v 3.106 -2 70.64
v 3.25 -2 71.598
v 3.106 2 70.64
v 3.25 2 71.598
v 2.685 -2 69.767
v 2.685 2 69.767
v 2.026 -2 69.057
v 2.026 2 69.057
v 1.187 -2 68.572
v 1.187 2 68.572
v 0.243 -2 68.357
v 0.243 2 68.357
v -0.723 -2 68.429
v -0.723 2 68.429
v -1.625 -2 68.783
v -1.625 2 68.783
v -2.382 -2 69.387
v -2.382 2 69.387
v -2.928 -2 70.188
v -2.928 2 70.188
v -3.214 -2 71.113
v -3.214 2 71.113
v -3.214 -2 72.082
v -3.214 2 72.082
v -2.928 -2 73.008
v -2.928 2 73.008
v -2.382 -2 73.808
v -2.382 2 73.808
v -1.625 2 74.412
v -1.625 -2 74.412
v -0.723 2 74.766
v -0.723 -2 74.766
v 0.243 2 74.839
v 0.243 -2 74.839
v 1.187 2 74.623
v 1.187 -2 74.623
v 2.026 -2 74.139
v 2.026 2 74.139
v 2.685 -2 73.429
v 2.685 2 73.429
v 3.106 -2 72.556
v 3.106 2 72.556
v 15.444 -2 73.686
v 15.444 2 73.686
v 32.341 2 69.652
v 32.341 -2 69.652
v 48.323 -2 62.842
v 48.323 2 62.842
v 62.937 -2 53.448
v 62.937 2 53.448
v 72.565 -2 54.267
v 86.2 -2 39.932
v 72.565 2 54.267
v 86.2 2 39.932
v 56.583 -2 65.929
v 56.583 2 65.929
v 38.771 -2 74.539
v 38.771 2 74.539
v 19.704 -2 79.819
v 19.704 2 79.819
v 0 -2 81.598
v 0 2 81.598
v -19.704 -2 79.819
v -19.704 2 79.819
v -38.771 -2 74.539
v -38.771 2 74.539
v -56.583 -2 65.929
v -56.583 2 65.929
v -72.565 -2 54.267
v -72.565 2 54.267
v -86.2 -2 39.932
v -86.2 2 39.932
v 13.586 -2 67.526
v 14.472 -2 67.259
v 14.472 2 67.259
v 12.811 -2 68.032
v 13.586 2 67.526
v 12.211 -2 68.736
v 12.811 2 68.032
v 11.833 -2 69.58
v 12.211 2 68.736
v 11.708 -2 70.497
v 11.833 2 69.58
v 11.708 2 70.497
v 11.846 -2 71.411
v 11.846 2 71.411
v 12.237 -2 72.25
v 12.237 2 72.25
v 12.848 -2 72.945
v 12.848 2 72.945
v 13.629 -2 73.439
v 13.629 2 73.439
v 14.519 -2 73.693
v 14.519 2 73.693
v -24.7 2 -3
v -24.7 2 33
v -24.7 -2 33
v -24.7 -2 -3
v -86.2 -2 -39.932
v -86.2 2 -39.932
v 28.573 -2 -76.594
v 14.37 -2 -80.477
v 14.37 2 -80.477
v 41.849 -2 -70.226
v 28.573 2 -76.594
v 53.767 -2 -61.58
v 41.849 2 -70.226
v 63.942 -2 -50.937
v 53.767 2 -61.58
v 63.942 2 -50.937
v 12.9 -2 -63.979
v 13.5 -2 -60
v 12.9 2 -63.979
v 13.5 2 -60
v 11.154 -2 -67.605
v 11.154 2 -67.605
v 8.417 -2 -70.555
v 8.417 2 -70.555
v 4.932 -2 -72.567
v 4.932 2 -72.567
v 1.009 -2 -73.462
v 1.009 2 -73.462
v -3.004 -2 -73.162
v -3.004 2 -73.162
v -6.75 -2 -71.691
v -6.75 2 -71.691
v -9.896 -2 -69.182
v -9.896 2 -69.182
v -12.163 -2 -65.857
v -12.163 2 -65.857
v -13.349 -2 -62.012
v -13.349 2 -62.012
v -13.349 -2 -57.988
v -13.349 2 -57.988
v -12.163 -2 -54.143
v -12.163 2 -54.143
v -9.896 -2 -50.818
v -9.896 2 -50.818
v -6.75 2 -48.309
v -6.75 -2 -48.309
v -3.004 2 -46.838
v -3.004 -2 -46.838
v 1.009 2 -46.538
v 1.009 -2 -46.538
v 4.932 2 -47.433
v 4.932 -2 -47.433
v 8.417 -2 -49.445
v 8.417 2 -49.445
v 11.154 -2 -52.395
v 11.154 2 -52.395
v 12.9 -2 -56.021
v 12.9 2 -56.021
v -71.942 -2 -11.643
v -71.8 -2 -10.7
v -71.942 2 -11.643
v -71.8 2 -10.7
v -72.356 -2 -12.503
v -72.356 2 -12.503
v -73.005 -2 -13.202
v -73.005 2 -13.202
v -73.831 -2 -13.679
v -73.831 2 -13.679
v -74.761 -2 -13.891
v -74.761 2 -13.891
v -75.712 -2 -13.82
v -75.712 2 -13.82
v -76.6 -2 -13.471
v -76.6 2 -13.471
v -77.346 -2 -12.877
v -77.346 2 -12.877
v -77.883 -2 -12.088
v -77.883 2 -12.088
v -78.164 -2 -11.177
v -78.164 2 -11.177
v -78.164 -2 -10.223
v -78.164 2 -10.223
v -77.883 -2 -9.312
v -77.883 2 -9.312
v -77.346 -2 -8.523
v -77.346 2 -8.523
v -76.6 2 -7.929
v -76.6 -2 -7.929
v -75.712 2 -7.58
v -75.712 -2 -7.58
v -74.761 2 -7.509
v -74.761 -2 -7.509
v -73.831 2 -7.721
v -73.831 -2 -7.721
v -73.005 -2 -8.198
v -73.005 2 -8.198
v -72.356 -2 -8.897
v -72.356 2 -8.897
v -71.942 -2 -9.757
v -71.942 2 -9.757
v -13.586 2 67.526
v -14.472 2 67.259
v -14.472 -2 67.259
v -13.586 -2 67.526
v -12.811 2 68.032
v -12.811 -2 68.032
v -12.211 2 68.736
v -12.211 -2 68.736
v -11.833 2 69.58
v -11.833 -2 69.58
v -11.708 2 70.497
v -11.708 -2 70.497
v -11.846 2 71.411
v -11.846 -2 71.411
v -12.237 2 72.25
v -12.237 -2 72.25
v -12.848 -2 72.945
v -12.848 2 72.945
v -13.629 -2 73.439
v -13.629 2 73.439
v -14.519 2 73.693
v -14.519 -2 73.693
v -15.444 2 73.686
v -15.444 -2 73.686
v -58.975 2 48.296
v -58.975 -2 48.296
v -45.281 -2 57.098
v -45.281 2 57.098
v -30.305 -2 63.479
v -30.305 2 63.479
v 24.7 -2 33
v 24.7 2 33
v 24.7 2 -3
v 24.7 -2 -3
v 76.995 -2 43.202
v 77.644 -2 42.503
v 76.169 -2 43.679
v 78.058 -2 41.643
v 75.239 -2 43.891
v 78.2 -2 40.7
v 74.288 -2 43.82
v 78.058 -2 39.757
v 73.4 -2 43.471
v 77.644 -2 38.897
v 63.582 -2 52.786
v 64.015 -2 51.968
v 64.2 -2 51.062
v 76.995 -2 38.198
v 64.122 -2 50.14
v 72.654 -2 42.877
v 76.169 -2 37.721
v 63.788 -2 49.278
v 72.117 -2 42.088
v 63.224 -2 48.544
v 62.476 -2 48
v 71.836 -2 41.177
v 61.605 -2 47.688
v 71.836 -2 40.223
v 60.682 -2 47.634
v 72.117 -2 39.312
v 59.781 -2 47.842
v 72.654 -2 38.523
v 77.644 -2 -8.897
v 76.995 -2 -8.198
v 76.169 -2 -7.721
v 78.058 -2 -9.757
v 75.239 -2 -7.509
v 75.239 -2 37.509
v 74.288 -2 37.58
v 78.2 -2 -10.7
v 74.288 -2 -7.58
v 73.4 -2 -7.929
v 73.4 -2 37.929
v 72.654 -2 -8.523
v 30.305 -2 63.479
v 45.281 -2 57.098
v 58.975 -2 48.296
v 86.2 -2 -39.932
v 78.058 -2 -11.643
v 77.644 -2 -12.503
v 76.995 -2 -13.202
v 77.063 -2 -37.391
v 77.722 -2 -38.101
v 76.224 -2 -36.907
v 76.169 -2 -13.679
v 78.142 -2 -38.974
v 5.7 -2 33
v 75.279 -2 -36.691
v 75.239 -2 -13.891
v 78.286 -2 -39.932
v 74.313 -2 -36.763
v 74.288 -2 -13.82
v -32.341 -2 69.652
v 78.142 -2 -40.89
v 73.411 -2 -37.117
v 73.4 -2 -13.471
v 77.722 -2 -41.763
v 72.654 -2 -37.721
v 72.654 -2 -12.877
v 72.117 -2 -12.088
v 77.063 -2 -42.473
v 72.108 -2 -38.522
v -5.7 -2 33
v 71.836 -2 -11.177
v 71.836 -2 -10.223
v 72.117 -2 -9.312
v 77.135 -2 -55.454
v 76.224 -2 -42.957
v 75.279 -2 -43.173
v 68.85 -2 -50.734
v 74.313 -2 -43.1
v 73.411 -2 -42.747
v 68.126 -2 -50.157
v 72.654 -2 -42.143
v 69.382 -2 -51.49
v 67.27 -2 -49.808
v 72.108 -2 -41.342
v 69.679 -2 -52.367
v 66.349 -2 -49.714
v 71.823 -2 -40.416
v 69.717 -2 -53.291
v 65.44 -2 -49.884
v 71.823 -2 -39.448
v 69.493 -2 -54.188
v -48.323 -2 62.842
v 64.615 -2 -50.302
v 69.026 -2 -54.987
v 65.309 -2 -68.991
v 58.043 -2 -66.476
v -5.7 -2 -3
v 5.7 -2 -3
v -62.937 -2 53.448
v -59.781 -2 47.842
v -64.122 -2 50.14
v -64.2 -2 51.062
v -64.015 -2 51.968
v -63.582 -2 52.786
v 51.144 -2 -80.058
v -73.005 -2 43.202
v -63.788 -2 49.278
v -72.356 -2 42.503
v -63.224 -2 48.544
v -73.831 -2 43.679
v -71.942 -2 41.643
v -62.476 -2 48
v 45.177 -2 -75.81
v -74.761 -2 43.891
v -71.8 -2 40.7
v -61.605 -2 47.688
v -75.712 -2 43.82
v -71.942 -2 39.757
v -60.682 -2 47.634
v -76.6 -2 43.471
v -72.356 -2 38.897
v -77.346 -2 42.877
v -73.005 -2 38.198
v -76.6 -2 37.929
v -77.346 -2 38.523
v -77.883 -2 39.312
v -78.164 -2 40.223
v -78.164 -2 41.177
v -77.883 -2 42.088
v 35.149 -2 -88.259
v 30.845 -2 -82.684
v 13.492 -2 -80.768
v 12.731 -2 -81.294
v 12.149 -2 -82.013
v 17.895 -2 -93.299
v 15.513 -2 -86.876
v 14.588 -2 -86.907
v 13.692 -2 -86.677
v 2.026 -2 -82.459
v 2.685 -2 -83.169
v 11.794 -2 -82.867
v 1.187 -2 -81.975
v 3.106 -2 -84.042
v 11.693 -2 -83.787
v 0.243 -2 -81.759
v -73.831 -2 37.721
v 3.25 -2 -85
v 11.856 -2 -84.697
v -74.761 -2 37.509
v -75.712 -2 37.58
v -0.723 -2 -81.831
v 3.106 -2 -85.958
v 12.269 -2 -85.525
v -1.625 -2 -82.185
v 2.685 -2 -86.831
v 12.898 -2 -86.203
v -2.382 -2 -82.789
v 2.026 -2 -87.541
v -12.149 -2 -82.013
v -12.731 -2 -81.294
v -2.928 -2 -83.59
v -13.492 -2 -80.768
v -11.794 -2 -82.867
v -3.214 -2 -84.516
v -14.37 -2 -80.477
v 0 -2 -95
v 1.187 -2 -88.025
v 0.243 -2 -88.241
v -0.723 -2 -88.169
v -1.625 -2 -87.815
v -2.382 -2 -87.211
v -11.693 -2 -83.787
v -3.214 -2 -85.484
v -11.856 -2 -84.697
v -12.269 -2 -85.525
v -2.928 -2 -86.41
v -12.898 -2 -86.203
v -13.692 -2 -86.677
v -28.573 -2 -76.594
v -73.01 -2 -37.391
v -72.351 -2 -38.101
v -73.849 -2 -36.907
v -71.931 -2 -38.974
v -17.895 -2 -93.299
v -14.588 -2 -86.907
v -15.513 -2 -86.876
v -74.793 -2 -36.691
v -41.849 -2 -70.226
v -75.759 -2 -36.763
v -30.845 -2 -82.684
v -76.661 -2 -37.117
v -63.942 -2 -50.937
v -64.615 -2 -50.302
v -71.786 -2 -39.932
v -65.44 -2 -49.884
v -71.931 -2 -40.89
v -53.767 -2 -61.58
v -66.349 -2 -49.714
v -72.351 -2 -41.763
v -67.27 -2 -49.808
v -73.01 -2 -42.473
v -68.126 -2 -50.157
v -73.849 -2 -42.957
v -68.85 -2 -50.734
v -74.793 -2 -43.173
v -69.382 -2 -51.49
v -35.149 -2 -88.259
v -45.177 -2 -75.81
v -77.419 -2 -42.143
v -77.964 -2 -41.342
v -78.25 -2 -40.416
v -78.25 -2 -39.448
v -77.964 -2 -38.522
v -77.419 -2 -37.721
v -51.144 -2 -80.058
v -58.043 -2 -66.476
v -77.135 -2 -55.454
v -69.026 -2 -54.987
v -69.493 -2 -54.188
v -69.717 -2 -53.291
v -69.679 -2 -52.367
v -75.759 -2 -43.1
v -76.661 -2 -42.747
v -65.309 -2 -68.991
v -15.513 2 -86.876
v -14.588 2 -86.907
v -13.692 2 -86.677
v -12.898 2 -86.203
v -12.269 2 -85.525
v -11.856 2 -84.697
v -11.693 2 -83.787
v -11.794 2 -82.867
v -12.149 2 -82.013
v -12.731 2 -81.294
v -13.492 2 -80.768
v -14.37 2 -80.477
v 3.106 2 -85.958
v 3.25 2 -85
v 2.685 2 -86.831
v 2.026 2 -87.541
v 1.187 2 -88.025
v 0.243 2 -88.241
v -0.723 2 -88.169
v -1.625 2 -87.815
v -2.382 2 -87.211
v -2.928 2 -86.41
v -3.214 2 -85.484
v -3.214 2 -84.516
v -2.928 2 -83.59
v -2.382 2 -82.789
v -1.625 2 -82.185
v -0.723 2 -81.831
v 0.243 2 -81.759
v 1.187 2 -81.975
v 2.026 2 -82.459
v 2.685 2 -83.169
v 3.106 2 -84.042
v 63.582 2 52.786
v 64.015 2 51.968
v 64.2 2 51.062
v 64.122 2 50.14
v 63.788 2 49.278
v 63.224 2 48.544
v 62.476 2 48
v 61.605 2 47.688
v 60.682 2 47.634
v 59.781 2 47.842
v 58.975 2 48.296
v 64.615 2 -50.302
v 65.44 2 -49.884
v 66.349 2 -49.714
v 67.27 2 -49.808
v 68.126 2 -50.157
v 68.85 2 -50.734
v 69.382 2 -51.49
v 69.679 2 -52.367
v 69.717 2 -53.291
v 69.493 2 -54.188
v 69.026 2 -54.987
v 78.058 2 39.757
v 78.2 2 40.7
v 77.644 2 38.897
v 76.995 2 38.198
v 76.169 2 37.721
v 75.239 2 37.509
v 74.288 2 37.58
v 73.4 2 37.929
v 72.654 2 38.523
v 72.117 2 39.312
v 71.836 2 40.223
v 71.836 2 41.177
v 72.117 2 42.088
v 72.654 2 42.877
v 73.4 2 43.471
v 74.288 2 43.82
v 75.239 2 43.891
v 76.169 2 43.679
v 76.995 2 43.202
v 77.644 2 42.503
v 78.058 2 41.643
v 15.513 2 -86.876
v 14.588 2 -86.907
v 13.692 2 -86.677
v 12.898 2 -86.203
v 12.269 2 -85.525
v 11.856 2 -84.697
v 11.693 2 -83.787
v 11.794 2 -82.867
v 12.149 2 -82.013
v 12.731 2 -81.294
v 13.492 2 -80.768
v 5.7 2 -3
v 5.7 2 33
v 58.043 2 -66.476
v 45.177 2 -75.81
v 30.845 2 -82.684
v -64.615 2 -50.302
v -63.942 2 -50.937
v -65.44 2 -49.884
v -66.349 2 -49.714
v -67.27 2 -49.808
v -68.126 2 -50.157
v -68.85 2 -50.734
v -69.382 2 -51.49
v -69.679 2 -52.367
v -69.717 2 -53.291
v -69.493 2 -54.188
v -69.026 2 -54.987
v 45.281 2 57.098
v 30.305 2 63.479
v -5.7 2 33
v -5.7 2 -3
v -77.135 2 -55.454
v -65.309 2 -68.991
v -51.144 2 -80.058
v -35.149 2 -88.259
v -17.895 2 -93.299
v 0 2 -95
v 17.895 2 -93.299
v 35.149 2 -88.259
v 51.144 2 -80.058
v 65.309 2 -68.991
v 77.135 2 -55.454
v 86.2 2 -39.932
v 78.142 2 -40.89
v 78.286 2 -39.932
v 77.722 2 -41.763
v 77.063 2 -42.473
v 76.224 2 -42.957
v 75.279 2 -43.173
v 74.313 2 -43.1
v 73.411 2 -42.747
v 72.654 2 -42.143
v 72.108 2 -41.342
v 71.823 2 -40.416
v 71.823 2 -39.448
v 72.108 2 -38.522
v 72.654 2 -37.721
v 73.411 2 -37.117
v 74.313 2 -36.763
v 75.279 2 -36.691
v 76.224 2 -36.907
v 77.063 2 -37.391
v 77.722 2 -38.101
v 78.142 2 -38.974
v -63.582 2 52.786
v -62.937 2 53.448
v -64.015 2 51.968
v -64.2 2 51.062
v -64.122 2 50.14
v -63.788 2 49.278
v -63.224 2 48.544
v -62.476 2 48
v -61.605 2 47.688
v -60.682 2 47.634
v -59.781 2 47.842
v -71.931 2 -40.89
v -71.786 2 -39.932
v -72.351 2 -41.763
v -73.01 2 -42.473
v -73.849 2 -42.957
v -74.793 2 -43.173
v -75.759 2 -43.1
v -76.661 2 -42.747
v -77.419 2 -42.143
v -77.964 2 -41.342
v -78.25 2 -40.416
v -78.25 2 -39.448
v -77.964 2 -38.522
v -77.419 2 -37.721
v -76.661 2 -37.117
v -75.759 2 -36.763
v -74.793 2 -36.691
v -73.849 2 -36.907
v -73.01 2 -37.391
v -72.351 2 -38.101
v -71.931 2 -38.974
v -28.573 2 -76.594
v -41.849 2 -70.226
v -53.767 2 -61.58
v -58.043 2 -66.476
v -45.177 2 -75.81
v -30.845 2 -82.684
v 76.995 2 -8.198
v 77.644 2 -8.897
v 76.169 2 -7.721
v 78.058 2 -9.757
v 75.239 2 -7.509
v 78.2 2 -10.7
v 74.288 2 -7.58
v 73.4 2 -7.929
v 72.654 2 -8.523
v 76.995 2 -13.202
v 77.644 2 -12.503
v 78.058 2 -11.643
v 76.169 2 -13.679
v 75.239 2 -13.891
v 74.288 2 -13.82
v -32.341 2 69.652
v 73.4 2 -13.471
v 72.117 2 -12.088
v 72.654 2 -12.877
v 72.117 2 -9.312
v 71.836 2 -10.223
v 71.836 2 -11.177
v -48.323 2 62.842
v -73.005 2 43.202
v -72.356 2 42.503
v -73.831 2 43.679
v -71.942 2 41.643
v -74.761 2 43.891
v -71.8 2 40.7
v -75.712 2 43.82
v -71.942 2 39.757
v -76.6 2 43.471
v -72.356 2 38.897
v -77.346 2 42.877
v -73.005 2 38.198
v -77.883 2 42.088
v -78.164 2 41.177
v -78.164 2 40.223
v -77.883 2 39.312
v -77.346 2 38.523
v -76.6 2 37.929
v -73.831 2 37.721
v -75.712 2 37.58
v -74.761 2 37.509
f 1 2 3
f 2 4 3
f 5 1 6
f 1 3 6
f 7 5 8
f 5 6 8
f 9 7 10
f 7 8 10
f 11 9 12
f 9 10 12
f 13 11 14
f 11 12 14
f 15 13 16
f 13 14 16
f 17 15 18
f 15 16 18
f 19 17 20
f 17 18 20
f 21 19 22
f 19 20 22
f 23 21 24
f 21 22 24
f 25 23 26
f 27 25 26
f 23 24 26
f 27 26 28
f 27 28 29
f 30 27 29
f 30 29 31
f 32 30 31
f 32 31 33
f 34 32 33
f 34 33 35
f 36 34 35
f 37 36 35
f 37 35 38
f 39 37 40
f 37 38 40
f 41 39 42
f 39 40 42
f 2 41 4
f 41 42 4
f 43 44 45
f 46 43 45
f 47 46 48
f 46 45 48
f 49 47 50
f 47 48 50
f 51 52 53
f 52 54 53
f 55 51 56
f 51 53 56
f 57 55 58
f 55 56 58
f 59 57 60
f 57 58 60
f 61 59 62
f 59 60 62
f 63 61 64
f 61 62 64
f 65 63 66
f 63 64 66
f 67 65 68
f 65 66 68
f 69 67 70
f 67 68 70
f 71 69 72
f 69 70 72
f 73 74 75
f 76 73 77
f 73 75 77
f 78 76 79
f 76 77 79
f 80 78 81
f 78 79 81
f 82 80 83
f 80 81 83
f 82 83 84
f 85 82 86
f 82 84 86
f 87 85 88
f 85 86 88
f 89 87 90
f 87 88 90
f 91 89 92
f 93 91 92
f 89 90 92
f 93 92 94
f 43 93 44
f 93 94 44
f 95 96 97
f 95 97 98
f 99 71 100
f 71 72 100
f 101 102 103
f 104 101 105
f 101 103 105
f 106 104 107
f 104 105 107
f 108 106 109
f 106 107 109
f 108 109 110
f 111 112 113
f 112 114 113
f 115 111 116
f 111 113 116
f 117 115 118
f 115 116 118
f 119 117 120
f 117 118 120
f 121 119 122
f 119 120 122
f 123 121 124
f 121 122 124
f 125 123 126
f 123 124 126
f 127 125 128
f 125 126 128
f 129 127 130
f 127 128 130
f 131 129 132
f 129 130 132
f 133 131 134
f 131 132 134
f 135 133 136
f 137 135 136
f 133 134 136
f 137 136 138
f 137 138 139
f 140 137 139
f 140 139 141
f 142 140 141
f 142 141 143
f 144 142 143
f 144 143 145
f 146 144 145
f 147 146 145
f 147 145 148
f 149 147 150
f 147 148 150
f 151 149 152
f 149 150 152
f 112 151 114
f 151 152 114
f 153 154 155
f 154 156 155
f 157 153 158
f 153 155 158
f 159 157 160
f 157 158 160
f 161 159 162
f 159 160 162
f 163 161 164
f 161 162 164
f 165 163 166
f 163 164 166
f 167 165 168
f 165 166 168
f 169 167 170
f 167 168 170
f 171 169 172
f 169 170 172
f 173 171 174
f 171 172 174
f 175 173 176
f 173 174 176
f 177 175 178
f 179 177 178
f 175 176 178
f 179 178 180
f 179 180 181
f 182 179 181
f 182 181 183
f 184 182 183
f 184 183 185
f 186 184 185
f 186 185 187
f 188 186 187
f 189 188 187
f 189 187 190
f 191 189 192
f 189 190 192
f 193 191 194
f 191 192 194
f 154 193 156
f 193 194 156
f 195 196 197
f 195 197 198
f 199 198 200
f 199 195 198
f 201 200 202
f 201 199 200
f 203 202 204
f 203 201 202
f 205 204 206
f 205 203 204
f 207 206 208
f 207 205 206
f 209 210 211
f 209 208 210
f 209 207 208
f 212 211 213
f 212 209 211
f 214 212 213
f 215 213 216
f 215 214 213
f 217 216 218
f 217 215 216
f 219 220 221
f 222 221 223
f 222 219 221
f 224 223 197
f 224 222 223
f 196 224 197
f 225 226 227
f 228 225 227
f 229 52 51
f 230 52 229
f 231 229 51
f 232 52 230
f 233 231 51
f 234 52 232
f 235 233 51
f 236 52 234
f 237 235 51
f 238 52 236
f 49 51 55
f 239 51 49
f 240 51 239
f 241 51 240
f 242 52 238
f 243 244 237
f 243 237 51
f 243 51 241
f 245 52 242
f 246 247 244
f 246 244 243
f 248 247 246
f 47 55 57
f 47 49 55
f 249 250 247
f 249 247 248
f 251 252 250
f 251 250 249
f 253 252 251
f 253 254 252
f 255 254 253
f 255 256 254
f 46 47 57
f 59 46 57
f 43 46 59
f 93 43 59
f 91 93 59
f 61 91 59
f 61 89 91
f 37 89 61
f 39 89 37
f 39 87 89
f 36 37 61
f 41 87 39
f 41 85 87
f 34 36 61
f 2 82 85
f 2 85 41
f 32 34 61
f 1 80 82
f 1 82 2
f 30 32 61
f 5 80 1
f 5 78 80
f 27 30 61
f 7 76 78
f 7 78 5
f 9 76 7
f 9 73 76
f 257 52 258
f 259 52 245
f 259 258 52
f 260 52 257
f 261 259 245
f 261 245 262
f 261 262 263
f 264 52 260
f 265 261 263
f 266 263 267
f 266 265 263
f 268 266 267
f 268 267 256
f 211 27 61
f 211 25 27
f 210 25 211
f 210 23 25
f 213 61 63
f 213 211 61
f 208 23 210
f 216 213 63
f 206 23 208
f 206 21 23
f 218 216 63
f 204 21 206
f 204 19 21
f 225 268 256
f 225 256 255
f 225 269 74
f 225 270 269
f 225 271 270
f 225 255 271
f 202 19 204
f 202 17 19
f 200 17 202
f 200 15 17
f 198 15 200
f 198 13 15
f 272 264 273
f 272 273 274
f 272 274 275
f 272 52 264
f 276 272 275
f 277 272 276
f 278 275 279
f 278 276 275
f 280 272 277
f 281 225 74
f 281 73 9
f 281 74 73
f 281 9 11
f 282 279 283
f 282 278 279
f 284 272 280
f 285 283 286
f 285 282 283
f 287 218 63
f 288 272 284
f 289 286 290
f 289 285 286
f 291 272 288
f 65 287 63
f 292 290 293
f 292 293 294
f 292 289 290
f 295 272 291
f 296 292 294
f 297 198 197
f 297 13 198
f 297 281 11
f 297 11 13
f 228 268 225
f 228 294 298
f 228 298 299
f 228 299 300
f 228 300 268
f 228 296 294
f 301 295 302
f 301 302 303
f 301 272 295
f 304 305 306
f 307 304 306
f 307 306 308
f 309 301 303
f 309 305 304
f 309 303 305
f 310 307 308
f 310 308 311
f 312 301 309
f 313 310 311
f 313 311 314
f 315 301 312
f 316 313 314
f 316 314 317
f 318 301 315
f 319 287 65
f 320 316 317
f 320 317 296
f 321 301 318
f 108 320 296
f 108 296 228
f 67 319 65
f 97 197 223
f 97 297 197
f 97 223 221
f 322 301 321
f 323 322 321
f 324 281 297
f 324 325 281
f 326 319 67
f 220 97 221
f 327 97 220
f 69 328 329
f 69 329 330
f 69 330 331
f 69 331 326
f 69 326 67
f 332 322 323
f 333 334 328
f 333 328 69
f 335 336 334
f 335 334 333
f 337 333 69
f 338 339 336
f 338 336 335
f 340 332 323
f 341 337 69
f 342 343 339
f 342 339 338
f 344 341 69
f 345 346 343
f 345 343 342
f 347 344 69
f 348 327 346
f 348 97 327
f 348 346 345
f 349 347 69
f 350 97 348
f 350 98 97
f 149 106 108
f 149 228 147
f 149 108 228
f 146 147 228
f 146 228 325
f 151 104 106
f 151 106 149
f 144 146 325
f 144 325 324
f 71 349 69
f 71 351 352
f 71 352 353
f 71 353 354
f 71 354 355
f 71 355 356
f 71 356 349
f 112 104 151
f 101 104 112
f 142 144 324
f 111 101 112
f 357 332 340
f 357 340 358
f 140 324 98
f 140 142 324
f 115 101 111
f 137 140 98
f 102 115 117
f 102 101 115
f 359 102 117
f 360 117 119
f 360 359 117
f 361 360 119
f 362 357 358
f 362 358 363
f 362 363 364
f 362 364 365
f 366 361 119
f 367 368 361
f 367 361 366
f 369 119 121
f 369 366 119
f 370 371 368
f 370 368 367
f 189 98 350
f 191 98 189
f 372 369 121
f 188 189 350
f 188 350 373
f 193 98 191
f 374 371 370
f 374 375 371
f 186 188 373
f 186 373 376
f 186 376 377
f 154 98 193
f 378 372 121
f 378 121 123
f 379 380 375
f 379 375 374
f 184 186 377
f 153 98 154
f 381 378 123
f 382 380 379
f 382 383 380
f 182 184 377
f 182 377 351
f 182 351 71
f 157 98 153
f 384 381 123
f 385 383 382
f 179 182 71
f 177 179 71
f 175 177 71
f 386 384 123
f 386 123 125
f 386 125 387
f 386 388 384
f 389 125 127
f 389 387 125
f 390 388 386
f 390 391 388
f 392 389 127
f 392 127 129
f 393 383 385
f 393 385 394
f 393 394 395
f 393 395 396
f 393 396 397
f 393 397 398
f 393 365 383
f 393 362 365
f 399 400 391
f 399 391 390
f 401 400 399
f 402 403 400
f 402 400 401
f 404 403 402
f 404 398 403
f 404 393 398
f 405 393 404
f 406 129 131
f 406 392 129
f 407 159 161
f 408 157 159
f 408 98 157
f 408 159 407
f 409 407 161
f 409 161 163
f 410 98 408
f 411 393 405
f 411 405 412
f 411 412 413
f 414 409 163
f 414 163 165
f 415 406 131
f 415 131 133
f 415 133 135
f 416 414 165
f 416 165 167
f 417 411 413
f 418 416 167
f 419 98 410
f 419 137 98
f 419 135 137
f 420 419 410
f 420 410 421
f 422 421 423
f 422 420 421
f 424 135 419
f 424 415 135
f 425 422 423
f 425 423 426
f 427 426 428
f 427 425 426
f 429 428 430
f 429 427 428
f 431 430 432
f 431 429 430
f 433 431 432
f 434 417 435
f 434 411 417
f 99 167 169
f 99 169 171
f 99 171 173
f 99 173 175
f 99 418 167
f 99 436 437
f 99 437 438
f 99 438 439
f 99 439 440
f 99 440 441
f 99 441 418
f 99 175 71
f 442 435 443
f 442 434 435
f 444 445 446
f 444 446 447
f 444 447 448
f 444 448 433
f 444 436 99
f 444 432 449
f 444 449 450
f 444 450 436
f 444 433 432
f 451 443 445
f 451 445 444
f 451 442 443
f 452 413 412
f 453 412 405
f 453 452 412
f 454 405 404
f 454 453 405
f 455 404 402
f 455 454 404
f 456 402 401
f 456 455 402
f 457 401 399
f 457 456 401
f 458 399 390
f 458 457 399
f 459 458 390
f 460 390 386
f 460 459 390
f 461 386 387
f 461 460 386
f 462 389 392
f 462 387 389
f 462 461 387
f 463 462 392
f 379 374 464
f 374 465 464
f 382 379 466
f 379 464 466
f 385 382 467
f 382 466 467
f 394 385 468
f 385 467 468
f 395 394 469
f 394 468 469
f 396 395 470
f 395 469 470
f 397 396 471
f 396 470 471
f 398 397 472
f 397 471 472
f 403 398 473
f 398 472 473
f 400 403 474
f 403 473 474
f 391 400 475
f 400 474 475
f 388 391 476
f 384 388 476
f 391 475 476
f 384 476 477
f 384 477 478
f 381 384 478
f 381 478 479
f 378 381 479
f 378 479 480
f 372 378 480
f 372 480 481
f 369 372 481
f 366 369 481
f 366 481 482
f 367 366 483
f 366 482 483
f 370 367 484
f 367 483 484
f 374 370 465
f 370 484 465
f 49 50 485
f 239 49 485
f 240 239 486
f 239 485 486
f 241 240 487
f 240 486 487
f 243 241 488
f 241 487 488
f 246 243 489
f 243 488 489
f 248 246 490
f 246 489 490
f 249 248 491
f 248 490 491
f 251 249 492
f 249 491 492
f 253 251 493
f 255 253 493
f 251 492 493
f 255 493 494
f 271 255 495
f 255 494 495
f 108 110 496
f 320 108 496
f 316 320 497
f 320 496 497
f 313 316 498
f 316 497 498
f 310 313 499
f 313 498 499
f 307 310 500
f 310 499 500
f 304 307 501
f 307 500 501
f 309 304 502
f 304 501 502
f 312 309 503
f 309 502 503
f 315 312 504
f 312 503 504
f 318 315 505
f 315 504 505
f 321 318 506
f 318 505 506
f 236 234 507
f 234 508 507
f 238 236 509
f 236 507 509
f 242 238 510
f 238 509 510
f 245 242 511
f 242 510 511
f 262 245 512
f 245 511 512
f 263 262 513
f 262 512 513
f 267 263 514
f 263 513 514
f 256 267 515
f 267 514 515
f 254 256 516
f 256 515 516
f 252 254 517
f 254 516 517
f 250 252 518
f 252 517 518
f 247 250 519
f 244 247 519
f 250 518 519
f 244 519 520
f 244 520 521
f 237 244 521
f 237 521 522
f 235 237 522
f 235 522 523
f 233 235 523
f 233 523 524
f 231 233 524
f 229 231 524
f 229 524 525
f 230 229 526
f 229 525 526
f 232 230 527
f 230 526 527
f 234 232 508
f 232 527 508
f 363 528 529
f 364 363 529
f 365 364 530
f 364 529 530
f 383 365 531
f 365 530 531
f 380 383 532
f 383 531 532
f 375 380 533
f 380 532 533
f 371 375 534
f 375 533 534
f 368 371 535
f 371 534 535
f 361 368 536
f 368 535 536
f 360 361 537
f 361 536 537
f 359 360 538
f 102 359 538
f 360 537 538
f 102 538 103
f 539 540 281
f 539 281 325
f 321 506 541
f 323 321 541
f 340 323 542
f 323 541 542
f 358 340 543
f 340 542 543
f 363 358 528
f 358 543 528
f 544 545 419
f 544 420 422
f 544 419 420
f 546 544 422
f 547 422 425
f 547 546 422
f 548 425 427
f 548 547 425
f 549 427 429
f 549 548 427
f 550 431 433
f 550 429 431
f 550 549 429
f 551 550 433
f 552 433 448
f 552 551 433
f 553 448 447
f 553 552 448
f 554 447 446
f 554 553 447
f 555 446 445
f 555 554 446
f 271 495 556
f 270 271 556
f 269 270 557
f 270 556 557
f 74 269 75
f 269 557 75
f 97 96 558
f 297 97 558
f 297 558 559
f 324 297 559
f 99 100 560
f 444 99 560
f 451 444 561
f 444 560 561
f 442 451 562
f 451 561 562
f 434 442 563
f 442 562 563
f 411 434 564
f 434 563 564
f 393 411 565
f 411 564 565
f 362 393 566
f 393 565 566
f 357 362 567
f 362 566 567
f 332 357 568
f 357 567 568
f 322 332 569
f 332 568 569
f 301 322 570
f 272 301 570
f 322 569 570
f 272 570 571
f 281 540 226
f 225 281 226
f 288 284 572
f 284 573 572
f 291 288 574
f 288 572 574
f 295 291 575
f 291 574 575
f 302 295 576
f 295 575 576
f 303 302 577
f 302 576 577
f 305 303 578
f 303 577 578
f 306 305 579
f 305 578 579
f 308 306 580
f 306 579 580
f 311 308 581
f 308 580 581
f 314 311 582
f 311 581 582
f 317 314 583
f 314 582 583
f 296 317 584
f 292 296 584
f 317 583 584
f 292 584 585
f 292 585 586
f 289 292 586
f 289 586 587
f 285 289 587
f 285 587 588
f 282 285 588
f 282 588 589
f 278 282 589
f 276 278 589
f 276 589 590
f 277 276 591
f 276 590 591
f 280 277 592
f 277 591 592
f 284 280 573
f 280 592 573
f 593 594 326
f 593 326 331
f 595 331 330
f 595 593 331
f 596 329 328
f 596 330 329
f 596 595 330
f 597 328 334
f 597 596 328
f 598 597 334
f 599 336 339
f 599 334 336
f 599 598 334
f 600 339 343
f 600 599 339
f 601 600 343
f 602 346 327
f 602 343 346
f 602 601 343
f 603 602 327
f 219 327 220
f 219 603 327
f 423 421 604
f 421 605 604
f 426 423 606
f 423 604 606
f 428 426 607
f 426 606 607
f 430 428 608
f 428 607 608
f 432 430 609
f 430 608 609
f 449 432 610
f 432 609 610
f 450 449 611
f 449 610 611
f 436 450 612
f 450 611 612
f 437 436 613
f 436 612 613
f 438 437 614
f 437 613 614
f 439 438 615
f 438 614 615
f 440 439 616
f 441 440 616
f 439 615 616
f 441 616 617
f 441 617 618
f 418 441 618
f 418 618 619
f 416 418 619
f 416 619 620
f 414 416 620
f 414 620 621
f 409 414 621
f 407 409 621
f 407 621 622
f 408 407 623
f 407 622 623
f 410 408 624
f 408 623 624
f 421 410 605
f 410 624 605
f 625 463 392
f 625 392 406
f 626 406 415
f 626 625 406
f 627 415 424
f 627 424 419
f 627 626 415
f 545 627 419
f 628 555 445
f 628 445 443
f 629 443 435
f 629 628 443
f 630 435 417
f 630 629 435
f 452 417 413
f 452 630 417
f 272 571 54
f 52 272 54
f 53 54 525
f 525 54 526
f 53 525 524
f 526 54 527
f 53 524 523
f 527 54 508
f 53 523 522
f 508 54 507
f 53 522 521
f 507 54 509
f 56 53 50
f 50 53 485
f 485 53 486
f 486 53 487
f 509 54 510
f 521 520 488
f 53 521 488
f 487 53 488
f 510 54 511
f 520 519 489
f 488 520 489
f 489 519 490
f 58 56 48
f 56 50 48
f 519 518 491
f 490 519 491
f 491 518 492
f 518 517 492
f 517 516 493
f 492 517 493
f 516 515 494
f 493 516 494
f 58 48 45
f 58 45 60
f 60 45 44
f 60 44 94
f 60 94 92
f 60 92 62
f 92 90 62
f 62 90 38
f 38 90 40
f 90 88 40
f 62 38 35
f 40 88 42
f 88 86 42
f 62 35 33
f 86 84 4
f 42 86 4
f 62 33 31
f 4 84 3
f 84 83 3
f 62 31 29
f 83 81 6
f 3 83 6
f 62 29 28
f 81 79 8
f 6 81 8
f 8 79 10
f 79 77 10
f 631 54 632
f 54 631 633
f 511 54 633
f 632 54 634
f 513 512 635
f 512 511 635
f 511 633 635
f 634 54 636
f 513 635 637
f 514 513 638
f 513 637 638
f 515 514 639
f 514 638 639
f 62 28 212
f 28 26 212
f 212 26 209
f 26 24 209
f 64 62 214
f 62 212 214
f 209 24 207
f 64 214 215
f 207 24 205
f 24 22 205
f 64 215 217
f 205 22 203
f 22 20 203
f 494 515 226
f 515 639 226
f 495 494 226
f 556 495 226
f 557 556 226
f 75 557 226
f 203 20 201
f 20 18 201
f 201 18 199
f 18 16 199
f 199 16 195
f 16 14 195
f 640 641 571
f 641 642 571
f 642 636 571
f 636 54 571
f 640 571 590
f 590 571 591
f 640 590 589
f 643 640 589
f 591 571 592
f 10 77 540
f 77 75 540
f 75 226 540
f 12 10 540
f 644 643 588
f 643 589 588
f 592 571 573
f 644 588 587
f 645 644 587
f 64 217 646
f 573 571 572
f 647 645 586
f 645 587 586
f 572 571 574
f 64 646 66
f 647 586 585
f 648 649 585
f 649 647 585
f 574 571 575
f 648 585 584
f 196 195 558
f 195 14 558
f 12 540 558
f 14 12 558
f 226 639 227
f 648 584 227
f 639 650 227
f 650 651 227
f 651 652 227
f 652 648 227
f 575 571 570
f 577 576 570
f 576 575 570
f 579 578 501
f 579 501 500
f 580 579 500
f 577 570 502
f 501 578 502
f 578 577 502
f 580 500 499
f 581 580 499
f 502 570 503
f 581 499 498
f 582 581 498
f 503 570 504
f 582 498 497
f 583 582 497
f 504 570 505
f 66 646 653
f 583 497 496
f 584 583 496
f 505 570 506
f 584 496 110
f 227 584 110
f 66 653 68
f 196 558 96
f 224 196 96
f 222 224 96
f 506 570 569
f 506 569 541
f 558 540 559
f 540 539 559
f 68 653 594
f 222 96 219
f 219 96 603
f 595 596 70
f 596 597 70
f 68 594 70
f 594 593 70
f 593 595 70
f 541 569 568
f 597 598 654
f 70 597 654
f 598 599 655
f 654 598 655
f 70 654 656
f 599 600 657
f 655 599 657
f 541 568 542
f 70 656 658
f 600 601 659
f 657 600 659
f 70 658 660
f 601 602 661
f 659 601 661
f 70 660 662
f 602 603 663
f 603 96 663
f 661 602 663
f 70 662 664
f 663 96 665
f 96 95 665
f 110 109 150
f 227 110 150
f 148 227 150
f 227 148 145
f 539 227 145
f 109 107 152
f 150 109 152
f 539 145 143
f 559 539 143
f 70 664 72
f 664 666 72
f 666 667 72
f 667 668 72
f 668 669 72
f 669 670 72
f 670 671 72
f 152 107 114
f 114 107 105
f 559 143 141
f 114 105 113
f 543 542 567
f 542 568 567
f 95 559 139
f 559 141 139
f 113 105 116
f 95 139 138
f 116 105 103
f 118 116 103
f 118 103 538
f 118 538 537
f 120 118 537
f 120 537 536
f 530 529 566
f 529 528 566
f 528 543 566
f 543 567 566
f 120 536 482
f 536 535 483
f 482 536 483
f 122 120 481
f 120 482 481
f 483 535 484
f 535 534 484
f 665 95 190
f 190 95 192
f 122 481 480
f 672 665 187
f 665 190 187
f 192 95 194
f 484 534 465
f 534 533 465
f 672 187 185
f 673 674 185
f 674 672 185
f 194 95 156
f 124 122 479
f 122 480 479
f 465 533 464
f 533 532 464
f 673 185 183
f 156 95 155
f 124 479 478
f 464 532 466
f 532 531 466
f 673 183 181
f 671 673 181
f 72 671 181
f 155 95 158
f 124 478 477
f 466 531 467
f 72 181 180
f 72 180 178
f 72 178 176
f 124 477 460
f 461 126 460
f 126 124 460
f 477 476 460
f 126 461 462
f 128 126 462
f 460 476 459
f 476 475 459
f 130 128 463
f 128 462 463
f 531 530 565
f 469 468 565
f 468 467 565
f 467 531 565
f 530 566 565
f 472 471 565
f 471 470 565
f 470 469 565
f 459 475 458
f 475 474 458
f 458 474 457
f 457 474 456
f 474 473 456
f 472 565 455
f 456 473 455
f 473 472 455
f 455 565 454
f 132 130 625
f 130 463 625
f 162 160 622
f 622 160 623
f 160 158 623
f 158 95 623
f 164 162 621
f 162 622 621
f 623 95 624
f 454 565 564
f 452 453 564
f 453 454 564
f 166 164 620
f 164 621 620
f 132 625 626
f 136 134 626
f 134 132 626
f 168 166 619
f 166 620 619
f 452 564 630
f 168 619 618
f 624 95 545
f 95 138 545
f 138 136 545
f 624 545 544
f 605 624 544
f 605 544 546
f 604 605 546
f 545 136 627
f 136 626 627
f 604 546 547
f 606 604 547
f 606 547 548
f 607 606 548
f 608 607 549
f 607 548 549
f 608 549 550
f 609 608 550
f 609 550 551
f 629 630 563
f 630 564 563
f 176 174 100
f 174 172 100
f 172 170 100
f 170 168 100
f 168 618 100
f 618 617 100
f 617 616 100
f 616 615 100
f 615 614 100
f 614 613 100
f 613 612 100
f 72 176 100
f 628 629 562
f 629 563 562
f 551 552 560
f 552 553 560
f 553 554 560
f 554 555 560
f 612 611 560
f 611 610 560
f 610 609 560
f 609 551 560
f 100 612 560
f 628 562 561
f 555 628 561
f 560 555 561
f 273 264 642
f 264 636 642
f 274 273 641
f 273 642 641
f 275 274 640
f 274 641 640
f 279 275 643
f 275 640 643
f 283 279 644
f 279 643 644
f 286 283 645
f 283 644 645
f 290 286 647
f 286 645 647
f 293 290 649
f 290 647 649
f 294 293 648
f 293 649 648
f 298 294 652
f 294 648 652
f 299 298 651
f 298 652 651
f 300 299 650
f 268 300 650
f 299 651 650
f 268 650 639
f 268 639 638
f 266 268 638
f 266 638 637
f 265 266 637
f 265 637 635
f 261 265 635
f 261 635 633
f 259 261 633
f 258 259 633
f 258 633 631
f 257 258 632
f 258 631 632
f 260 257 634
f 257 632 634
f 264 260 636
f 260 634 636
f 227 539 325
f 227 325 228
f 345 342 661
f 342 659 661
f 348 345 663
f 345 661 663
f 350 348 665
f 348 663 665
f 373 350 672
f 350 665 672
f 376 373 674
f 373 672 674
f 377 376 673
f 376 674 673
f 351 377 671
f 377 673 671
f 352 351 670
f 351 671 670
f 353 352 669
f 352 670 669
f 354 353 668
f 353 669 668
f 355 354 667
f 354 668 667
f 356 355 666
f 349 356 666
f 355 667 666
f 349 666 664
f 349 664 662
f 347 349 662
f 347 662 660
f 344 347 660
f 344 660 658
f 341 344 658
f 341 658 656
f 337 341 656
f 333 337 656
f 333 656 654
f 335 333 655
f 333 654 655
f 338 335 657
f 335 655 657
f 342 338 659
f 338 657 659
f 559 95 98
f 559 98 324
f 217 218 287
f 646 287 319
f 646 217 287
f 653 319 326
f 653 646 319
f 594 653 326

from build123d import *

# Parameters (mm, degrees)
BOSS_EXTRUDE1_DEPTH     = 2
SKETCH2_R               = 3.2
SKETCH2_R_2             = 3.25
CUT_HOLES_DEPTH         = 3
CUT_HOLES_DEPTH_BACK    = 3
SKETCH3_R               = 13.5
SKETCH3_W               = 19
SKETCH3_H               = 36
CUT_EXTRUDE2_DEPTH      = 3
CUT_EXTRUDE2_DEPTH_BACK = 3


with BuildPart() as part:
    # Sketch1 → Boss-Extrude1 (new body, symmetric)
    with BuildSketch(Plane(origin=(0, 0, 0), x_dir=(1, 0, 0), z_dir=(0, 1, 0))):
        with BuildLine():
            Line((86.2, 39.931942102), (86.2, -39.931942102))
            ThreePointArc((86.2, -39.931942102), (0, -81.597763245), (-86.2, -39.931942102))
            Line((-86.2, -39.931942102), (-86.2, 39.931942102))
            ThreePointArc((-86.2, 39.931942102), (0, 95), (86.2, 39.931942102))
        make_face()
    extrude(amount=BOSS_EXTRUDE1_DEPTH, both=True)

    # Sketch2 → Cut-Holes (cut, two sides)
    with BuildSketch(Plane(origin=(0, 0, 0), x_dir=(1, 0, 0), z_dir=(0, 1, 0))) as cut_holes_sk:
        with Locations((-75, 10.7)):
            Circle(SKETCH2_R)
        with Locations((-75, -40.7)):
            Circle(SKETCH2_R)
        with Locations((75, -40.7)):
            Circle(SKETCH2_R)
        with Locations((75, 10.7)):
            Circle(SKETCH2_R)
        with Locations((0, -71.597763245)):
            Circle(SKETCH2_R_2)
        with Locations((0, 85)):
            Circle(SKETCH2_R_2)
        with Locations((-75.036257902, 39.931942102)):
            Circle(SKETCH2_R_2)
        with Locations((75.036257902, 39.931942102)):
            Circle(SKETCH2_R_2)
        with BuildLine():
            ThreePointArc((14.471626034, -67.259325745), (11.744315506, -70.958890218), (15.443879979, -73.686200745))
            ThreePointArc((15.443879979, -73.686200745), (40.475581865, -66.58349782), (62.936747266, -53.448409812))
            ThreePointArc((62.936747266, -53.448409812), (63.532100029, -48.890937367), (58.974627584, -48.295584605))
            ThreePointArc((58.974627584, -48.295584605), (37.92748228, -60.603766345), (14.471626034, -67.259325745))
        make_face()
        with BuildLine():
            ThreePointArc((-62.936747266, -53.448409812), (-63.532100029, -48.890937367), (-58.974627584, -48.295584605))
            ThreePointArc((-58.974627584, -48.295584605), (-37.92748228, -60.603766345), (-14.471626034, -67.259325745))
            ThreePointArc((-14.471626034, -67.259325745), (-11.744315506, -70.958890218), (-15.443879979, -73.686200745))
            ThreePointArc((-15.443879979, -73.686200745), (-40.475581865, -66.58349782), (-62.936747266, -53.448409812))
        make_face()
        with BuildLine():
            ThreePointArc((-63.94162293, 50.936542452), (-68.508644796, 50.419520904), (-69.025666344, 54.98654277))
            ThreePointArc((-69.025666344, 54.98654277), (-45.1765399, 75.809911903), (-15.512787354, 86.875865052))
            ThreePointArc((-15.512787354, 86.875865052), (-11.742100438, 84.24776304), (-14.37020245, 80.477076125))
            ThreePointArc((-14.37020245, 80.477076125), (-41.849089369, 70.226179015), (-63.94162293, 50.936542452))
        make_face()
        with BuildLine():
            ThreePointArc((15.512787354, 86.875865052), (11.742100438, 84.24776304), (14.37020245, 80.477076125))
            ThreePointArc((14.37020245, 80.477076125), (41.849089369, 70.226179015), (63.94162293, 50.936542452))
            ThreePointArc((63.94162293, 50.936542452), (68.508644796, 50.419520904), (69.025666344, 54.98654277))
            ThreePointArc((69.025666344, 54.98654277), (45.1765399, 75.809911903), (15.512787354, 86.875865052))
        make_face()
    extrude(amount=CUT_HOLES_DEPTH, mode=Mode.SUBTRACT)
    extrude(cut_holes_sk.sketch, amount=-CUT_HOLES_DEPTH_BACK, mode=Mode.SUBTRACT)

    # Sketch3 → Cut-Extrude2 (cut, two sides)
    with BuildSketch(Plane(origin=(0, 0, 0), x_dir=(1, 0, 0), z_dir=(0, 1, 0))) as cut_extrude2_sk:
        with Locations((0, 60)):
            Circle(SKETCH3_R)
        with Locations((-15.2, -15)):
            Rectangle(SKETCH3_W, SKETCH3_H)
        with Locations((15.2, -15)):
            Rectangle(SKETCH3_W, SKETCH3_H)
    extrude(amount=CUT_EXTRUDE2_DEPTH, mode=Mode.SUBTRACT)
    extrude(cut_extrude2_sk.sketch, amount=-CUT_EXTRUDE2_DEPTH_BACK, mode=Mode.SUBTRACT)


solid = part.part
